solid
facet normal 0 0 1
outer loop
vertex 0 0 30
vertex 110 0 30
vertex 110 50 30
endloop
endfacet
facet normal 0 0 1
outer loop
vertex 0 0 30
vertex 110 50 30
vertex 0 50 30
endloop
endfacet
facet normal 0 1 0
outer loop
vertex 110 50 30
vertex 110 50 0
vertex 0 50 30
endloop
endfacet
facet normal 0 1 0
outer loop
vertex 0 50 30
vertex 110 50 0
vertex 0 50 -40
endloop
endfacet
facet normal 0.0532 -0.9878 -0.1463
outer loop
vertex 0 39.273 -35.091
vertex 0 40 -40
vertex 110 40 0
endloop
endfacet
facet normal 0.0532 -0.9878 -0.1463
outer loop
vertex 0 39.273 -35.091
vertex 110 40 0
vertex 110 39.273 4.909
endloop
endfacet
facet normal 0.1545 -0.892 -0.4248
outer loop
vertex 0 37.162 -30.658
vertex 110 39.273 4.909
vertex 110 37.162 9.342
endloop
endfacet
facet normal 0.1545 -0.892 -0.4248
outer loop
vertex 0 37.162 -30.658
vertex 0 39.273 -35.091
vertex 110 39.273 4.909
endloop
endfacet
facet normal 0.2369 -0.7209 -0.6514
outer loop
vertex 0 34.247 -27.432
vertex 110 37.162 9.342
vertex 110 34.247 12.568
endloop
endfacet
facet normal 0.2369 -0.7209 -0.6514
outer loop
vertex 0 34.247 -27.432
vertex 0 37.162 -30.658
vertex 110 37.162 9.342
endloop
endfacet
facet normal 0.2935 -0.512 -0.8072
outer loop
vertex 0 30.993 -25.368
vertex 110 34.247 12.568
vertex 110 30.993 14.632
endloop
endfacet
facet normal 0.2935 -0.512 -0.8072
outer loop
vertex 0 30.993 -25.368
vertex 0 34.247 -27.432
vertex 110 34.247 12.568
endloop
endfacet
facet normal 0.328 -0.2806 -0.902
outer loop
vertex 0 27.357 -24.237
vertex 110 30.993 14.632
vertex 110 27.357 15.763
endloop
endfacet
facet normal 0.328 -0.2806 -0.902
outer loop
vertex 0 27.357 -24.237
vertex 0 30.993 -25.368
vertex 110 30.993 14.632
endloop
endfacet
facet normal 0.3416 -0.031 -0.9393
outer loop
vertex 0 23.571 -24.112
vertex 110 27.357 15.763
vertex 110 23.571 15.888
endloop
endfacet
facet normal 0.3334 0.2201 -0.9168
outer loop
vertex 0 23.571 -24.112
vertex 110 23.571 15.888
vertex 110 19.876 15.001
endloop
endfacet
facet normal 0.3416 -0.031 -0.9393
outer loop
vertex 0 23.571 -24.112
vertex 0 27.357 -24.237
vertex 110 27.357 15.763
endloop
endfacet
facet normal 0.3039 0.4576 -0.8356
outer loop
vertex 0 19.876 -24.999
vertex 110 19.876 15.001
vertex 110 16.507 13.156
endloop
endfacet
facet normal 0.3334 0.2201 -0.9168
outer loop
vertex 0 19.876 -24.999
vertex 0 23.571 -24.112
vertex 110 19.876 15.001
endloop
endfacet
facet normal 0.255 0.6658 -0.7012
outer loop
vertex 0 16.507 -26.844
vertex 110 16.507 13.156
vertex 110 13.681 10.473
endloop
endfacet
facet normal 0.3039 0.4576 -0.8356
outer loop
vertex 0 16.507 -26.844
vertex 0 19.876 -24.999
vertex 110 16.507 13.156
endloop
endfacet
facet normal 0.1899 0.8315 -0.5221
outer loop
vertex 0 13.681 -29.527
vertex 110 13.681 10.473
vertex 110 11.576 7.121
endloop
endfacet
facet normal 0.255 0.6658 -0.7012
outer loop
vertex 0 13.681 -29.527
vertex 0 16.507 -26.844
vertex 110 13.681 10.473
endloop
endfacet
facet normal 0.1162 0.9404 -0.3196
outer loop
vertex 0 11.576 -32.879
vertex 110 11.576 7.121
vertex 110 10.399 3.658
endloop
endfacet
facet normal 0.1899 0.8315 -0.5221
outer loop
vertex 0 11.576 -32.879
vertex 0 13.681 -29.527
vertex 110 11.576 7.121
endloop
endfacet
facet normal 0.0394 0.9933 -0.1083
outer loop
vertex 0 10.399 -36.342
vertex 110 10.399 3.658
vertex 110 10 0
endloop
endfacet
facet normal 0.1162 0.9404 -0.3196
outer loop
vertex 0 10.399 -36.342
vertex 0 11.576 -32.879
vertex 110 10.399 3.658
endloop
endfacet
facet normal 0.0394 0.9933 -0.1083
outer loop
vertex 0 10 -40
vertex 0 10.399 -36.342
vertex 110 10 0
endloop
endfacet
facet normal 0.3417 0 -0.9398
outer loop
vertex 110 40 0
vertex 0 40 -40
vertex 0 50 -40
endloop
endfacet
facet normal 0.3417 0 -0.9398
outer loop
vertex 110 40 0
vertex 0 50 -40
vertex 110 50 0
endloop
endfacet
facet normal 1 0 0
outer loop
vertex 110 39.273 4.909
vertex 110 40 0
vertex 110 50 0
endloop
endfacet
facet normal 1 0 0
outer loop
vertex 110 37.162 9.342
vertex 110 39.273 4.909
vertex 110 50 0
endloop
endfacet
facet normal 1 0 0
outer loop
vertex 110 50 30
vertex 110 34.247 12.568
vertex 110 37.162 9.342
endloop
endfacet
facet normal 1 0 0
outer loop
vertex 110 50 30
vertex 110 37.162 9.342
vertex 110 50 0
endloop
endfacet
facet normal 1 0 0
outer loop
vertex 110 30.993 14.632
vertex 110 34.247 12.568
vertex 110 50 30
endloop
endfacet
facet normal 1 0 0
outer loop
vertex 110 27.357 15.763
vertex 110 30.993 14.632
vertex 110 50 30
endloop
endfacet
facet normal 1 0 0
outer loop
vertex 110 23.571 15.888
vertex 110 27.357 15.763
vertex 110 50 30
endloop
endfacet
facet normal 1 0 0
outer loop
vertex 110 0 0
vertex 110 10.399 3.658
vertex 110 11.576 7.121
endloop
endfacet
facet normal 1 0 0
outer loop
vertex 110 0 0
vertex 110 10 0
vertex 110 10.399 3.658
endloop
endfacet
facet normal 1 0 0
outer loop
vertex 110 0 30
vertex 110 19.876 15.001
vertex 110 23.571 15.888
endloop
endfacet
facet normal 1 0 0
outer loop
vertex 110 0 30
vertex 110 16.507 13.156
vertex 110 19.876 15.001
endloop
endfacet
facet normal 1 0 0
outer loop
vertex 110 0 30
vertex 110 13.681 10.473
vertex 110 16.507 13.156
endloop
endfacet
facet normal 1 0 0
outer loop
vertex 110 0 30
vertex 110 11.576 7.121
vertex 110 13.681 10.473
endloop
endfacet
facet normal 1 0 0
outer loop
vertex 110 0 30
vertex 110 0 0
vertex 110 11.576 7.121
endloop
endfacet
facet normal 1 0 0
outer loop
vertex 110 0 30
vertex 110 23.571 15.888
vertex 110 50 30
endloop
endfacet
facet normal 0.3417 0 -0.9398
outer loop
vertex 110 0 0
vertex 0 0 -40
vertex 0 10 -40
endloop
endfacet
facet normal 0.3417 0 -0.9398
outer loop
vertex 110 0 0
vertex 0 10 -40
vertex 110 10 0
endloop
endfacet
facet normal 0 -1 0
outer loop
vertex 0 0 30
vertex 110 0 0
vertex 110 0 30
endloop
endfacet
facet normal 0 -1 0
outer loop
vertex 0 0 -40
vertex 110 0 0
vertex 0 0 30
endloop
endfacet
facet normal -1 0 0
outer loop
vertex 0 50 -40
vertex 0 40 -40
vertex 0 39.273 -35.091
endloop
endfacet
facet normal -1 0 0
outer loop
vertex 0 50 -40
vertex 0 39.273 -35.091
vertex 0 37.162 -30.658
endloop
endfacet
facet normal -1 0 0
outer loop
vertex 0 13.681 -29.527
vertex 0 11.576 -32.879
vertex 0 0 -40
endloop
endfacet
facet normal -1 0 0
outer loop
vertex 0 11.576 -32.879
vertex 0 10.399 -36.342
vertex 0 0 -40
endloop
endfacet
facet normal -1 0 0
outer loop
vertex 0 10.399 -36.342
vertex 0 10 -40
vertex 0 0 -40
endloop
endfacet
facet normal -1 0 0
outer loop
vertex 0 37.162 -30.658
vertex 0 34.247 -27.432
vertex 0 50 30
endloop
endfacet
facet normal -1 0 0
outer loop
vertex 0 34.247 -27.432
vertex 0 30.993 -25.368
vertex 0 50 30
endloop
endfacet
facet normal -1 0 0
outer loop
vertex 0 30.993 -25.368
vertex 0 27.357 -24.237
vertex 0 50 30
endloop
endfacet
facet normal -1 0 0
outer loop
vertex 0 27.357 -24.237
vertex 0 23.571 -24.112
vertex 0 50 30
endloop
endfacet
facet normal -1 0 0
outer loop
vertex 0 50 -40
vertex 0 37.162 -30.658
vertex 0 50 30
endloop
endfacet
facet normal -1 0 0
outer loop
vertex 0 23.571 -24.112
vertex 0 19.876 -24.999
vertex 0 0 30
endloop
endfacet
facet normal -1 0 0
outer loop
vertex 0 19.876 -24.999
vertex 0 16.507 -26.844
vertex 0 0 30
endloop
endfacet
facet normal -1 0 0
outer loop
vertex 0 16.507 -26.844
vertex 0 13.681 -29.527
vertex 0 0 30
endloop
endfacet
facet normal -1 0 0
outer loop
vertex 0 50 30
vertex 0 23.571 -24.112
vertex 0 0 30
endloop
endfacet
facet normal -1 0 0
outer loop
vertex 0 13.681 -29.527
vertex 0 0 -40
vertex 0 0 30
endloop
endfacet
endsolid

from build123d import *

# Parameters (mm, degrees)
BOSS_EXTRUDE1_DEPTH = 50
SKETCH3_R           = 15
CUT_EXTRUDE2_DEPTH  = 128.299291


with BuildPart() as part:
    # Sketch2 → Boss-Extrude1 (new body)
    with BuildSketch(Plane(origin=(0, 0, 0), x_dir=(1, 0, 0), z_dir=(0, 1, 0))):
        Polygon((0, 0), (0, 40), (110, 0), (110, -30), (0, -30), align=None)
    extrude(amount=BOSS_EXTRUDE1_DEPTH)

    # Sketch3 → Cut-Extrude2 (cut, through all)
    with BuildSketch(Plane(origin=(-12.846715328, 0, -4.671532847), x_dir=(0.341743063, 0, -0.939793423), z_dir=(0.939793423, 0, 0.341743063))):
        with Locations((37.59173694, 25)):
            Circle(SKETCH3_R)
    extrude(amount=CUT_EXTRUDE2_DEPTH, mode=Mode.SUBTRACT)


solid = part.part
